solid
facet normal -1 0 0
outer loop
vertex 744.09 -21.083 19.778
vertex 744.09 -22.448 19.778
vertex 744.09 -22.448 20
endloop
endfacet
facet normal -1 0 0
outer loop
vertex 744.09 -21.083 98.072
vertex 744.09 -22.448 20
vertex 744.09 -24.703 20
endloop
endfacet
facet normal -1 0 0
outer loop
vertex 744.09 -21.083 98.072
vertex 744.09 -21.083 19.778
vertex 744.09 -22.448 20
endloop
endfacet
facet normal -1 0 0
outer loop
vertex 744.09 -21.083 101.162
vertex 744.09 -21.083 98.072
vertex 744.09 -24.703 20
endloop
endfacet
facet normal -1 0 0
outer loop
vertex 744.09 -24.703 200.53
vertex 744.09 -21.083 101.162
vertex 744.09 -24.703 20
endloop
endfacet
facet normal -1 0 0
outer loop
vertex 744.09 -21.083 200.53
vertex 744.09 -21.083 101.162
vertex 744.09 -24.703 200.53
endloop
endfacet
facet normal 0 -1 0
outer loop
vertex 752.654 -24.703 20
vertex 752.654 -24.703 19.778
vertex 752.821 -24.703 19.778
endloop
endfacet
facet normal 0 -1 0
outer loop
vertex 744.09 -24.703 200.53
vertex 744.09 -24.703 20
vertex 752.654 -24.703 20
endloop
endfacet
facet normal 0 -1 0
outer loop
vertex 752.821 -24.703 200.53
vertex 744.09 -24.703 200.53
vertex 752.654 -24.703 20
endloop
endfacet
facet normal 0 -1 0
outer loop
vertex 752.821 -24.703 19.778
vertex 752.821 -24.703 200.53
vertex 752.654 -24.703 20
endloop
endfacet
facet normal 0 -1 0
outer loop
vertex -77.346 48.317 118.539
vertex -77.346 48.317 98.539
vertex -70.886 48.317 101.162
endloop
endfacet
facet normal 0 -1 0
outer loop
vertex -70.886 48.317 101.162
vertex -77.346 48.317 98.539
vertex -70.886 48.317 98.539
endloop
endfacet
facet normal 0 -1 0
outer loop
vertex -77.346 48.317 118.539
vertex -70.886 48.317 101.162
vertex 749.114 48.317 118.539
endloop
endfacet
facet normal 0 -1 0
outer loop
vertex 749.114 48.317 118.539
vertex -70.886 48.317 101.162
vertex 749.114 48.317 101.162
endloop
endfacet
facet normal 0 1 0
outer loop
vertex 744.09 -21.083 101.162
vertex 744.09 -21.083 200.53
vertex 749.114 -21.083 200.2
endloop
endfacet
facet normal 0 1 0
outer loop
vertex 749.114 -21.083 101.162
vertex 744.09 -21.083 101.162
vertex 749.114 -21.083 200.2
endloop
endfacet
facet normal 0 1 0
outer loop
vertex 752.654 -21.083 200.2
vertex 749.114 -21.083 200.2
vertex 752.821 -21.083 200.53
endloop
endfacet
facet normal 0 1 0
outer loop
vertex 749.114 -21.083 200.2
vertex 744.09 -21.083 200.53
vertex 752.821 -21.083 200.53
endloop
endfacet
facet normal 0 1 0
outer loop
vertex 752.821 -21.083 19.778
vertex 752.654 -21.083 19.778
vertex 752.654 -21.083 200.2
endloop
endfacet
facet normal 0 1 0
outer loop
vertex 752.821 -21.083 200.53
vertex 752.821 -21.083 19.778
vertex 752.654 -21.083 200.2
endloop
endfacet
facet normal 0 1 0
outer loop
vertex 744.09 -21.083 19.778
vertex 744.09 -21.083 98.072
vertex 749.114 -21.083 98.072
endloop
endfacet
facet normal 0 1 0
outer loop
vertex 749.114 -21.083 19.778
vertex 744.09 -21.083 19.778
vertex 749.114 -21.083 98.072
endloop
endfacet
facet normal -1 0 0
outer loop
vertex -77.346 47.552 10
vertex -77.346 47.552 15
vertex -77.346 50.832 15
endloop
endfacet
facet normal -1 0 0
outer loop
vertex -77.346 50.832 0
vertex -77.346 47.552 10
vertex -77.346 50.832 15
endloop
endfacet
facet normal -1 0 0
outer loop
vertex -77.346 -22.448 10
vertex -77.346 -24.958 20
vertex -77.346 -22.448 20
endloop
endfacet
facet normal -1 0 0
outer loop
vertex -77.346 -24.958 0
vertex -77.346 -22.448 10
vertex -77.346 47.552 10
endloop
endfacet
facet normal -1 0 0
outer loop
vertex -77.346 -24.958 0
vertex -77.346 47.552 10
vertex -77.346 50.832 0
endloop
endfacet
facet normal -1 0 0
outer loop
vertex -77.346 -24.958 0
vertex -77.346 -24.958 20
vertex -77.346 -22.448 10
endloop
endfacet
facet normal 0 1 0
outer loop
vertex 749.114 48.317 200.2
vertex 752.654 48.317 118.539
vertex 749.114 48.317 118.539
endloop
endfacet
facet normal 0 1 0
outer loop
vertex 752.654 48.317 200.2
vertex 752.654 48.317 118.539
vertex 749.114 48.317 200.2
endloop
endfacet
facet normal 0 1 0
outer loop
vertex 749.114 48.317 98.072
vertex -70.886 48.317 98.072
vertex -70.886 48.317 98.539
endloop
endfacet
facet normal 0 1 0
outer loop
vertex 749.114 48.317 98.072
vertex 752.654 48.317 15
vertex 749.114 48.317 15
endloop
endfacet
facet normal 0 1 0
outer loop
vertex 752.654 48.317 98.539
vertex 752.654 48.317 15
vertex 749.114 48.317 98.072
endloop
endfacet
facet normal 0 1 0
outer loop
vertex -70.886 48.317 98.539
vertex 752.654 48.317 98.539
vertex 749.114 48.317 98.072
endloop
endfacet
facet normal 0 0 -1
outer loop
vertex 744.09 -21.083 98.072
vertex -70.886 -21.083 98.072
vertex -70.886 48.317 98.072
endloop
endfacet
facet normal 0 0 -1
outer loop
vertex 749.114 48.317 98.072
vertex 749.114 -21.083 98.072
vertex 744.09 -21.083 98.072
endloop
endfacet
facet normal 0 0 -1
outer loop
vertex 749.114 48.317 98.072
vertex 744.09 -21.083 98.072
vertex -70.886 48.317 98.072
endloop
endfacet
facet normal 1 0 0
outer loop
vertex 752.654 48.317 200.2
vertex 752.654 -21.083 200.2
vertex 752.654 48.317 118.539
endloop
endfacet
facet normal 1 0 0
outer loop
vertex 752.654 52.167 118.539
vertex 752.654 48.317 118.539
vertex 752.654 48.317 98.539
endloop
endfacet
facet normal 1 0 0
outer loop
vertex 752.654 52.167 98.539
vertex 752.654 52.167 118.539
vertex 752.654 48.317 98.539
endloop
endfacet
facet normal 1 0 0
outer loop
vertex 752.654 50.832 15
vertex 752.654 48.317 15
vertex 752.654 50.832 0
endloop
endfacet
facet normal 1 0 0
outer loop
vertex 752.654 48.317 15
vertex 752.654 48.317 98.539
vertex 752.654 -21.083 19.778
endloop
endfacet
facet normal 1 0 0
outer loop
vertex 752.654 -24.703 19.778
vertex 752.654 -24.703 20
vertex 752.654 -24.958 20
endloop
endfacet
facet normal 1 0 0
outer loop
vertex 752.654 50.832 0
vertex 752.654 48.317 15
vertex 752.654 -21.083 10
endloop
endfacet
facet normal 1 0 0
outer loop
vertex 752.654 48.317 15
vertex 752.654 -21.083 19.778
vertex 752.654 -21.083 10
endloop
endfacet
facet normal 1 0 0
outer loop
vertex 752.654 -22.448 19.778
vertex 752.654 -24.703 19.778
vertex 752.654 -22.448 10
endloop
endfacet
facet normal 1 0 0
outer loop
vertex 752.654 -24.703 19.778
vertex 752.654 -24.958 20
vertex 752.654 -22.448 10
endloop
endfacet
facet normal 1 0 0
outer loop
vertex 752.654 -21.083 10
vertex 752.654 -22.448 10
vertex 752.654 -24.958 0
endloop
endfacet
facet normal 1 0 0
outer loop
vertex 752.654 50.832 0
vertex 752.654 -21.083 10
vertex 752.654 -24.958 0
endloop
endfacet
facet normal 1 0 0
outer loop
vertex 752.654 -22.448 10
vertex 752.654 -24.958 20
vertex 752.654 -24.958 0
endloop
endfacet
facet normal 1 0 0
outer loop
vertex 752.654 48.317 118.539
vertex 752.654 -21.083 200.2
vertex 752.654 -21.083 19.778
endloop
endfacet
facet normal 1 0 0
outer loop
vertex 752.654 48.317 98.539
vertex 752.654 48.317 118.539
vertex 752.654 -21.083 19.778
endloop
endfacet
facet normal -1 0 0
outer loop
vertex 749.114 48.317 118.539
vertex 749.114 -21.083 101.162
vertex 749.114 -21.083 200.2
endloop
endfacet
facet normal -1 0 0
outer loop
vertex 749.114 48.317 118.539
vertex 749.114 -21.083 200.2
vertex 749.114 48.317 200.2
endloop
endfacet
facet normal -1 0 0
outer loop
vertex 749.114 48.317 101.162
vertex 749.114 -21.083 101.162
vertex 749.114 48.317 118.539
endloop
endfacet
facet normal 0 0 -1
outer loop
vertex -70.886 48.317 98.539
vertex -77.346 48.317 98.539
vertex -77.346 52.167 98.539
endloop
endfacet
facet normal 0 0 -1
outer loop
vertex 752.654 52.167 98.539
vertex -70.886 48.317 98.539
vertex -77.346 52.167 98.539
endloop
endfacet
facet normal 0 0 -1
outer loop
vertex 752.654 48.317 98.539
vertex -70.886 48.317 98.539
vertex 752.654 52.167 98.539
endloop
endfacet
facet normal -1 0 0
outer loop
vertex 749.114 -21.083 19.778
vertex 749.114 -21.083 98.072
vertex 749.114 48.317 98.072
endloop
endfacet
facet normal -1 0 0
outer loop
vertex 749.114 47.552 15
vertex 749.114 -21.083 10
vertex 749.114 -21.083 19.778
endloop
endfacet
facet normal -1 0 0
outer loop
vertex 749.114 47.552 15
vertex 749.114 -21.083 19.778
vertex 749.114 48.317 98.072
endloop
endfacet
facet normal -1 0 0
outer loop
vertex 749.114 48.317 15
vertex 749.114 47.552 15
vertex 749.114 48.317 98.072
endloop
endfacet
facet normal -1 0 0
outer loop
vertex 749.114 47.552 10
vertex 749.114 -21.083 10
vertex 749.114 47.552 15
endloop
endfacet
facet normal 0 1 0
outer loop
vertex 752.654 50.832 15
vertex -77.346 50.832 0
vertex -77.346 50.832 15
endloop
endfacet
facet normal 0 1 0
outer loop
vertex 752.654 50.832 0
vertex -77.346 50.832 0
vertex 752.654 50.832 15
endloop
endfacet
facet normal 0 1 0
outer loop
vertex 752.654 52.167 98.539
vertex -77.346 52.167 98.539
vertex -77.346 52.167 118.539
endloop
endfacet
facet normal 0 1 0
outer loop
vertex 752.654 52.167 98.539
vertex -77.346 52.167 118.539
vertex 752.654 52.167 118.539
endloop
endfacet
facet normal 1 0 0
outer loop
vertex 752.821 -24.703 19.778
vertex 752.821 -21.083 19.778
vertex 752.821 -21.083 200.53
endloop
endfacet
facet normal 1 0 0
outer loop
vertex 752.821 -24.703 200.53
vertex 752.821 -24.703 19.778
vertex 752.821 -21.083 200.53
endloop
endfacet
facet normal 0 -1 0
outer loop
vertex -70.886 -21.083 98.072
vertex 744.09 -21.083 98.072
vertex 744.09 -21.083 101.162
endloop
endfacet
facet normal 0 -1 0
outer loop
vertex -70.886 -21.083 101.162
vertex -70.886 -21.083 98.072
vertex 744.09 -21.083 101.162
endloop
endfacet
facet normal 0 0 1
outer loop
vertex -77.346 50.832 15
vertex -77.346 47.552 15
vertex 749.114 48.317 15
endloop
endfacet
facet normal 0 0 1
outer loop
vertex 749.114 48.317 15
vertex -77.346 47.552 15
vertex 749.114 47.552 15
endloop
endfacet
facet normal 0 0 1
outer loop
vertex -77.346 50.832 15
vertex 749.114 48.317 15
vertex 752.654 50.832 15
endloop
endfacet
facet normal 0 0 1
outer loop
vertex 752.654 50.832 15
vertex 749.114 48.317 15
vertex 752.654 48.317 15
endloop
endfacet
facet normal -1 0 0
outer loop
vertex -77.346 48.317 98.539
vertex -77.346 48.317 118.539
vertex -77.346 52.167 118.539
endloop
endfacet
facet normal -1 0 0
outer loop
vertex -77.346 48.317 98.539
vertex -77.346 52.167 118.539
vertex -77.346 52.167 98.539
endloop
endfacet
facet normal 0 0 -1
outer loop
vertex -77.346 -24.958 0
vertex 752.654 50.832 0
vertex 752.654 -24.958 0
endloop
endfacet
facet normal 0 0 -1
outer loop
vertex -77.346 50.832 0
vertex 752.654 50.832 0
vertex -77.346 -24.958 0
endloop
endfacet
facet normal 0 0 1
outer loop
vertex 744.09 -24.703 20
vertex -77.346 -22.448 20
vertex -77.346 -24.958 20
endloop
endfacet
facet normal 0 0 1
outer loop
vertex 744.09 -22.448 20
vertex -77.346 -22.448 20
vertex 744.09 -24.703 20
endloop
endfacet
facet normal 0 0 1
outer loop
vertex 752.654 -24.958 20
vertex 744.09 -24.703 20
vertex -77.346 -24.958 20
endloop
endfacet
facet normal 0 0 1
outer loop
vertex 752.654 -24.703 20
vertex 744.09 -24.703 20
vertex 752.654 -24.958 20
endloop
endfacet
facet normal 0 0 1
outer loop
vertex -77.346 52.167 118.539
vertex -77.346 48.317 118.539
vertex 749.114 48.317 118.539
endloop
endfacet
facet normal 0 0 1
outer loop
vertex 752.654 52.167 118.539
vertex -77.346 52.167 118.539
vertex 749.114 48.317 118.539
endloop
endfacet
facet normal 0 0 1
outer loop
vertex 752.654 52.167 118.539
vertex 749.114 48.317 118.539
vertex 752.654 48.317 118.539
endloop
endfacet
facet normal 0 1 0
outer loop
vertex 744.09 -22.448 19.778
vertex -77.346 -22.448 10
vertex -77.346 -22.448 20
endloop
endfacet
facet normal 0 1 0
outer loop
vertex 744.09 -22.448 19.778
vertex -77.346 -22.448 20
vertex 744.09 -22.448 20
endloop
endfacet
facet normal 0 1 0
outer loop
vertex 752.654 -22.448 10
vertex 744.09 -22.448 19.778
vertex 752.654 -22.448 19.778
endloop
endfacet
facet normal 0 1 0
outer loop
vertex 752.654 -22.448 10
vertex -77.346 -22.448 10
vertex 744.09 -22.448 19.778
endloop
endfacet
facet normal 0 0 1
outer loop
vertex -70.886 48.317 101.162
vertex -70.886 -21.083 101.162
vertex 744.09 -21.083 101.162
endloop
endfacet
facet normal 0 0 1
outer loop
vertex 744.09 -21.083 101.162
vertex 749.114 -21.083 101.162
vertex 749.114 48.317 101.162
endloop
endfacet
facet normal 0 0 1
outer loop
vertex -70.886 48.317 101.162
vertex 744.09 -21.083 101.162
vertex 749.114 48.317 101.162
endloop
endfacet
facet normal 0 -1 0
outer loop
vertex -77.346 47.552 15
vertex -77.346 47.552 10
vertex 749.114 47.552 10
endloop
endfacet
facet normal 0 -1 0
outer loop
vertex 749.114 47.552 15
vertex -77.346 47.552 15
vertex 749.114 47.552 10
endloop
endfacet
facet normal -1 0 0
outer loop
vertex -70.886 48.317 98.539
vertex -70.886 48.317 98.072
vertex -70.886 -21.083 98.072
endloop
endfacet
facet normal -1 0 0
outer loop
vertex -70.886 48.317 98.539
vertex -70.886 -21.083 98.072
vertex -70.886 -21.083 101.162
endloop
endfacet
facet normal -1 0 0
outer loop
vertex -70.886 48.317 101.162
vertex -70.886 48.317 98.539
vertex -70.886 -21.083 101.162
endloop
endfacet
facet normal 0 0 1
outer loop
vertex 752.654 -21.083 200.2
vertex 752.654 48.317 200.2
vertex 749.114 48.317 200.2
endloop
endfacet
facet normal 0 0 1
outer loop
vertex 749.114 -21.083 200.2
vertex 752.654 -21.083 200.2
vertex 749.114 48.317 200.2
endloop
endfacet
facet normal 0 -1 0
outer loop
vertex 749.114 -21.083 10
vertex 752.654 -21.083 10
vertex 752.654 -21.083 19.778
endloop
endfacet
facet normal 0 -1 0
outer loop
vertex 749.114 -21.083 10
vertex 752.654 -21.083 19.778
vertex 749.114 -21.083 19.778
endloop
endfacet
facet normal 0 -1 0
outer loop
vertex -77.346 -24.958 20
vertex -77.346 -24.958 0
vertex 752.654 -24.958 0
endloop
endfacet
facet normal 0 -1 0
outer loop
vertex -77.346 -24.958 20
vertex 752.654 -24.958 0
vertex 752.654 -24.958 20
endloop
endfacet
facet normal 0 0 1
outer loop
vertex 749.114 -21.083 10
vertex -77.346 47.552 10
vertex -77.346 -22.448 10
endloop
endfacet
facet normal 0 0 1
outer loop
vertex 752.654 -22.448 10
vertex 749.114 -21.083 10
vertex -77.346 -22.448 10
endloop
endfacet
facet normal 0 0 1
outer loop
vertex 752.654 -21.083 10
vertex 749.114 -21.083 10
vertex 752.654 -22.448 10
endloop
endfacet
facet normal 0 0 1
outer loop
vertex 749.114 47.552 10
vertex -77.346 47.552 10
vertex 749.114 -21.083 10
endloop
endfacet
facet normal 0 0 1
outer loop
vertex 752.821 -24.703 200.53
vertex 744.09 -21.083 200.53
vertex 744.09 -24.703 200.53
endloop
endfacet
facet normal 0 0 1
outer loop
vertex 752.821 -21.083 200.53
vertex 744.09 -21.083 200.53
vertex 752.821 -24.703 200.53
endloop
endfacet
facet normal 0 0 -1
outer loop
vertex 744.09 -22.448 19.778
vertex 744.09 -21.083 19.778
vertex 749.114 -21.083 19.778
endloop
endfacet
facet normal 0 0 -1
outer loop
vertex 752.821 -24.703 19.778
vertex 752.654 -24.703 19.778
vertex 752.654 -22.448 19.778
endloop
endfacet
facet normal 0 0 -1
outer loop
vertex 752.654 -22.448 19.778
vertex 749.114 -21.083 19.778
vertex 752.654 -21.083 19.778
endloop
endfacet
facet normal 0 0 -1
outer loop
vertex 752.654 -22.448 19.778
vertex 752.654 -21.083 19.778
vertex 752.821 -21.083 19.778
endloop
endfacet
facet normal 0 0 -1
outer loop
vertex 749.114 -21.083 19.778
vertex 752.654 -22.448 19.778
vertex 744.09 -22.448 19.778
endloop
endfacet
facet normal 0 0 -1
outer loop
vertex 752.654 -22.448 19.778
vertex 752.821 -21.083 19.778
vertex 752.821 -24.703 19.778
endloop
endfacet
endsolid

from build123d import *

# Parameters (mm, degrees)
SKETCH_1_W          = 830
SKETCH_1_H          = 82.91
EXTRUDE_2_DEPTH     = 20
SKETCH_4_W          = 830
SKETCH_4_H          = 10
CUT_EXTRUDE_3_DEPTH = 70
SKETCH_5_W          = 830
SKETCH_5_H          = 15
EXTRUDE_3_DEPTH     = 3.28
SKETCH_6_W          = 3.54
SKETCH_6_H          = 69.4
EXTRUDE_5_DEPTH     = 200.2
SKETCH_8_W          = 20
SKETCH_8_H          = 10.39973114
CUT_EXTRUDE_5_DEPTH = 1000.2
SKETCH_9_W          = 8.730890719
SKETCH_9_H          = 180.752173936
EXTRUDE_6_DEPTH     = 3.62
SKETCH_10_W         = 3.09
SKETCH_10_H         = 69.4
EXTRUDE_7_DEPTH     = 820
SKETCH_13_W         = 830
SKETCH_13_H         = 20
EXTRUDE_18_DEPTH    = 3.85


with BuildPart() as part:
    # 草图1 → 凸台-拉伸2 (new body)
    with BuildSketch(Plane.XY):
        with Locations((337.654216889, 6.096927721)):
            Rectangle(SKETCH_1_W, SKETCH_1_H)
    extrude(amount=EXTRUDE_2_DEPTH)

    # 草图4 → 切除-拉伸3 (cut)
    with BuildSketch(Plane(origin=(0, 47.551927721, 0), x_dir=(1, 0, 0), z_dir=(0, 1, 0))):
        with Locations((337.654216889, -15)):
            Rectangle(SKETCH_4_W, SKETCH_4_H)
    extrude(amount=-CUT_EXTRUDE_3_DEPTH, mode=Mode.SUBTRACT)

    # 草图5 → 凸台-拉伸3 (add)
    with BuildSketch(Plane(origin=(0, 47.551927721, 0), x_dir=(1, 0, 0), z_dir=(0, 1, 0))):
        with Locations((337.654216889, -7.5)):
            Rectangle(SKETCH_5_W, SKETCH_5_H)
    extrude(amount=EXTRUDE_3_DEPTH)

    # 草图6 → 凸台-拉伸5 (add)
    with BuildSketch(Plane(origin=(752.654216889, 50.831927721, 0), x_dir=(-1, 0, 0), z_dir=(0, 0, -1))):
        with Locations((1.77, -37.215224989)):
            Rectangle(SKETCH_6_W, SKETCH_6_H)
    extrude(amount=-EXTRUDE_5_DEPTH)

    # 草图8 → 切除-拉伸5 (cut)
    with BuildSketch(Plane.ZY.offset(77.345783111)):
        with Locations((10, -30.158206709)):
            Rectangle(SKETCH_8_W, SKETCH_8_H)
    extrude(amount=-CUT_EXTRUDE_5_DEPTH, mode=Mode.SUBTRACT)

    # 草图9 → 凸台-拉伸6 (add)
    with BuildSketch(Plane.XZ.offset(21.083297268)):
        with Locations((748.455599967, 110.153891103)):
            Rectangle(SKETCH_9_W, SKETCH_9_H)
    extrude(amount=EXTRUDE_6_DEPTH)

    # 草图10 → 凸台-拉伸7 (add)
    with BuildSketch(Plane.ZY.offset(-749.114216889)):
        with Locations((99.616509489, 13.616702732)):
            Rectangle(SKETCH_10_W, SKETCH_10_H)
    extrude(amount=EXTRUDE_7_DEPTH)

    # 草图13 → 凸台-拉伸18 (add)
    with BuildSketch(Plane(origin=(0, 48.316702732, 0), x_dir=(1, 0, 0), z_dir=(0, 1, 0))):
        with Locations((337.654216889, -108.539027645)):
            Rectangle(SKETCH_13_W, SKETCH_13_H)
    extrude(amount=EXTRUDE_18_DEPTH)


solid = part.part
